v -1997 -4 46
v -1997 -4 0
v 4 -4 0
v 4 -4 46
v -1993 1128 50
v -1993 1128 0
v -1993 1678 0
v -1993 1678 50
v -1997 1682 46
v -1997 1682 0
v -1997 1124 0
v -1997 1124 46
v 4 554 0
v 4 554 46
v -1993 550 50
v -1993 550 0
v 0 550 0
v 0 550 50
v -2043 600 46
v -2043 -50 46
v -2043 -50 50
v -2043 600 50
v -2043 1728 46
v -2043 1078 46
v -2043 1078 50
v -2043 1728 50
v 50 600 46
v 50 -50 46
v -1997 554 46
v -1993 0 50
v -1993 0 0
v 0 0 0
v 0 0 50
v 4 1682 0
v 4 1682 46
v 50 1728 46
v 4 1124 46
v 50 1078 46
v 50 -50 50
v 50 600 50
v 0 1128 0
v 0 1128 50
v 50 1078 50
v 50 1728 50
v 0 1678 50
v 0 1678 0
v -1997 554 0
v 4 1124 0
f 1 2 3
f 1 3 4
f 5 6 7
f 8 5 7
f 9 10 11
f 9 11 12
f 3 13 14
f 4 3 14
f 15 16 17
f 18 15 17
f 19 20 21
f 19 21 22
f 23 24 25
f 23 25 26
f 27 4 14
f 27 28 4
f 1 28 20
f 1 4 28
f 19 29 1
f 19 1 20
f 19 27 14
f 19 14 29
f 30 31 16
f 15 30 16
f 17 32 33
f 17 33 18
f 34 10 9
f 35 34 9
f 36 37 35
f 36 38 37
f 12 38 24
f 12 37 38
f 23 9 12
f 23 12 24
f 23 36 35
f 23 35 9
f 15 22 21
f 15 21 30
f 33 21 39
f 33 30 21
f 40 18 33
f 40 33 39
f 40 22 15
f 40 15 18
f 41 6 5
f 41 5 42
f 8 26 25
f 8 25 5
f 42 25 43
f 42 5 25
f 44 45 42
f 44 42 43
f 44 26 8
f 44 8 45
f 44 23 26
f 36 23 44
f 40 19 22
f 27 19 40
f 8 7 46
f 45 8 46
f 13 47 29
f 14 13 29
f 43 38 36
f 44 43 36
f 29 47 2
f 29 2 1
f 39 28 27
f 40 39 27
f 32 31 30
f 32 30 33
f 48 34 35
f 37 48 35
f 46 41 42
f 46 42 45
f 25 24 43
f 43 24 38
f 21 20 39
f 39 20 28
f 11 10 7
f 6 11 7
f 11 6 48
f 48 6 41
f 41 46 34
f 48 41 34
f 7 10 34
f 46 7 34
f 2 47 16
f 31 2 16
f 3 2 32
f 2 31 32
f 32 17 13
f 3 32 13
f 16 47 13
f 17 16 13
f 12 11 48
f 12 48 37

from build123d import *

# Parameters (mm, degrees)
F0_W     = 2093
F0_H     = 650
F0_W_2   = 1993
F0_H_2   = 550
F1_DEPTH = 50
F2_W     = 46
F2_H     = 46
F3_DEPTH = 3000
F4_W     = 46
F4_H     = 46
F5_DEPTH = 3000


with BuildPart() as f1:
    # F0 (on Top) → F1 (new body)
    with BuildSketch(Plane.XY):
        with Locations((-996.5, 275)):
            Rectangle(F0_W, F0_H)
        with Locations((-996.5, 275)):
            Rectangle(F0_W_2, F0_H_2, mode=Mode.SUBTRACT)
        with Locations((-996.5, 1403)):
            Rectangle(F0_W, F0_H)
        with Locations((-996.5, 1403)):
            Rectangle(F0_W_2, F0_H_2, mode=Mode.SUBTRACT)
    extrude(amount=F1_DEPTH)

    # F2 (on face) → F3 (cut)
    with BuildSketch(Plane(origin=(-2043, 0, 0), x_dir=(0, -1, 0), z_dir=(-1, 0, 0))):
        with Locations((-1705, 23)):
            Rectangle(F2_W, F2_H)
        with Locations((-1101, 23)):
            Rectangle(F2_W, F2_H)
        with Locations((-577, 23)):
            Rectangle(F2_W, F2_H)
        with Locations((27, 23)):
            Rectangle(F2_W, F2_H)
    extrude(amount=-F3_DEPTH, mode=Mode.SUBTRACT)

    # F4 (on face) → F5 (cut)
    with BuildSketch(Plane(origin=(0, 1682, 0), x_dir=(-1, 0, 0), z_dir=(0, 1, 0))):
        with Locations((-27, 23)):
            Rectangle(F4_W, F4_H)
        with Locations((2020, 23)):
            Rectangle(F4_W, F4_H)
    extrude(amount=-F5_DEPTH, mode=Mode.SUBTRACT)


solid = f1.part
